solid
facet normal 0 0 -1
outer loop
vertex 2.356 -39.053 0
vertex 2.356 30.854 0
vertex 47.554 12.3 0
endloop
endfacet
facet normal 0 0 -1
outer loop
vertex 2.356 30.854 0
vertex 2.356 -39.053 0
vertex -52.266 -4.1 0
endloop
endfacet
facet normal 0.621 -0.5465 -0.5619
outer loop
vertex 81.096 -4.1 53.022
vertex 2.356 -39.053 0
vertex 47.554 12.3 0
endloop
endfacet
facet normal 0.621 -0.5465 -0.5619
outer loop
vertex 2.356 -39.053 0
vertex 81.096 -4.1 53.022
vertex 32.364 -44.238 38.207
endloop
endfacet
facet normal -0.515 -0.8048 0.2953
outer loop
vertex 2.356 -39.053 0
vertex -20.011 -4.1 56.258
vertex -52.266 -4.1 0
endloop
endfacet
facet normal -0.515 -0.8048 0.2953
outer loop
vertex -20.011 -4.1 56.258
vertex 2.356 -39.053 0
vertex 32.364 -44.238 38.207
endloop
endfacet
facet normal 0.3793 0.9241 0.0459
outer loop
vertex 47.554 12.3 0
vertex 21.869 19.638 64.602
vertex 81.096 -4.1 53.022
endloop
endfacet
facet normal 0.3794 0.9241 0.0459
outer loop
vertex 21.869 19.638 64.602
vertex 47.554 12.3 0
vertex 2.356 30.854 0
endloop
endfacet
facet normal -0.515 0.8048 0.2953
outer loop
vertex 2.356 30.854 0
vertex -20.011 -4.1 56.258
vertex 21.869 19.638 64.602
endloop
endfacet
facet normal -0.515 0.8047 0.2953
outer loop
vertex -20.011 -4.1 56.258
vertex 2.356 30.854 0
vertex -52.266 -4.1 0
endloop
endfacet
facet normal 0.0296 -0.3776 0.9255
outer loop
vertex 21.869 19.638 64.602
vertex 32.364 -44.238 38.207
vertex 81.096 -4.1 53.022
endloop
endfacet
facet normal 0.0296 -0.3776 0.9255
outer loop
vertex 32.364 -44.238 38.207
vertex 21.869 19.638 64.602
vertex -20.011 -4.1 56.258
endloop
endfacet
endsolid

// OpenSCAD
/* parametric asymmetric trigonal trapezohdron
   geometry from Matlab code by https://twitter.com/etzpcm
   Paul Matthews , Nottingham Uni 
   
   inspired by Henry Segerman's skew dice
     
*/

// Initial point
//x0
x0 = 1;
//y0
y0 = 0.9;
//z0
z0 = 0.7;
//scale 
scale=30;
// pip size
pip_size=5;
//pip spacing
pip_spacing=10;
//pip resolution 
pip_resolution=5;
//pip alignment - angle of alignment within face 
pip_alignment=50;
//corner radius
corner_radius =5;
// corner resolution
corner_resolution = 5;

function end() = "end";

m1= [[1,0,0], [0,-1,0], [0,0,-1]];   // 180 rotation about x axis
t=2*180/3;
c=cos(t);
s=sin(t);
m2= [ [c,s,0], [-s,c,0], [0,0,1]];   // 120 rotation about z axis

p0= [x0,y0,z0];  
//Ensure 4 face points are coplanar 
z = z0*(-s*x0+(c-1)*y0)*x0/((c-1)*x0+s*y0)/y0;

p1= m2 * p0;
p2= m2 * p1;
p3= m1 * p0;
p4= m2 * p3;
p5= m2 * p4;
p6 = [0,0,z];
p7 = [0,0,-z];
unit_vertices = [p0,p1,p2,p3,p4,p5,p6,p7];

// faces 2 and 3 reversed to get all faces with the same orientation
// faces reordered so face[i] has i+1 pips

faces = [[0,3,1,6], 
         [5,7,3,0],  
         [2,5,0,6],  
         [1,3,7,4], 
         [4,2,6,1], 
         [4,7,5,2], 
        ];

pips = [  
         [[0,0]],
         [[-1,1],[1,-1]],
         [[-1,-1],[0,0],[1,1]],
         [[-1,1],[1,1],[1,-1],[-1,-1]],
         [[-1,1],[1,1],[1,-1],[-1,-1],[0,0]],
         [[-1,1],[1,1],[1,-1],[-1,-1],[0,1],[0,-1]]
       ];

vertices = [for (v=unit_vertices) v * scale];
placed_vertices = place(vertices,faces,0);   
dice(placed_vertices,faces,corner_radius,pip_size,pip_spacing,pip_alignment) ;

module dice(vertices,faces,radius,size,spacing,alignment) {
   difference() {
      //  if(radius==0)
           polyhedron(vertices,faces);
      //  else hull() 
      //        for (v = vertices) translate(v) sphere(radius,          $fn=corner_resolution);

      //  for (i =[0:len(faces)-1])  {
      //      face = [for (p = faces[i]) vertices[p]];
      //      center=centroid(face);
      //      normal=normal(face);
      //      orient_to(center,normal) 
      //          for(place = pips[i]) 
      //              rotate([0,0,alignment])
      //               translate([place[0]*spacing,place[1]*spacing,radius+2*size/5])
      //               sphere(size,$fn=pip_resolution);
      //  }
     }
 }
function centroid(points) = 
      vsum(points) / len(points);

function vsum(points,i=0) =  
      i < len(points)
        ?  (points[i] + vsum(points,i+1))
        :  [0,0,0];

function orthogonal(v0,v1,v2) =  cross(v1-v0,v2-v1);

function normal(face) =
     let (n=orthogonal(face[0],face[1],face[2]))
     - n / norm(n);
            
module orient_to(centre, normal) {   
      translate(centre)
      rotate([0, 0, atan2(normal.y, normal.x)]) //rotation
      rotate([0, atan2(sqrt(pow(normal.x, 2)+pow(normal.y, 2)),normal.z), 0])
      children();
}

function place(vertices,faces,f) =
// place on nominated face for printing
   let (face= faces[f])
   let (points =[for (v=face) vertices[v]])
   let (n = normal(points), c=centroid(points))
   let (m=m_from(c,-n))
   [for (v=vertices) m_transform(v, m) ];

function m_from(centre,normal) = 
      m_translate(-centre)
    * m_rotate([0, 0, -atan2(normal.y, normal.x)]) 
    * m_rotate([0, -atan2(sqrt(pow(normal.x, 2) + pow(normal.y, 2)), normal.z), 0]); 

function m_translate(v) = [ [1, 0, 0, 0],
                            [0, 1, 0, 0],
                            [0, 0, 1, 0],
                            [v.x, v.y, v.z, 1  ] ];

function m_scale(v) =    [ [v.x, 0, 0, 0],
                            [0, v.y, 0, 0],
                            [0, 0, v.z, 0],
                            [0, 0, 0, 1  ] ];
                            
function m_rotate(v) =  [ [1,  0,         0,        0],
                          [0,  cos(v.x),  sin(v.x), 0],
                          [0, -sin(v.x),  cos(v.x), 0],
                          [0,  0,         0,        1] ]
                      * [ [ cos(v.y), 0,  -sin(v.y), 0],
                          [0,         1,  0,        0],
                          [ sin(v.y), 0,  cos(v.y), 0],
                          [0,         0,  0,        1] ]
                      * [ [ cos(v.z),  sin(v.z), 0, 0],
                          [-sin(v.z),  cos(v.z), 0, 0],
                          [ 0,         0,        1, 0],
                          [ 0,         0,        0, 1] ];
                            
function vec3(v) = [v.x, v.y, v.z];
function m_transform(v, m)  = vec3([v.x, v.y, v.z, 1] * m);
